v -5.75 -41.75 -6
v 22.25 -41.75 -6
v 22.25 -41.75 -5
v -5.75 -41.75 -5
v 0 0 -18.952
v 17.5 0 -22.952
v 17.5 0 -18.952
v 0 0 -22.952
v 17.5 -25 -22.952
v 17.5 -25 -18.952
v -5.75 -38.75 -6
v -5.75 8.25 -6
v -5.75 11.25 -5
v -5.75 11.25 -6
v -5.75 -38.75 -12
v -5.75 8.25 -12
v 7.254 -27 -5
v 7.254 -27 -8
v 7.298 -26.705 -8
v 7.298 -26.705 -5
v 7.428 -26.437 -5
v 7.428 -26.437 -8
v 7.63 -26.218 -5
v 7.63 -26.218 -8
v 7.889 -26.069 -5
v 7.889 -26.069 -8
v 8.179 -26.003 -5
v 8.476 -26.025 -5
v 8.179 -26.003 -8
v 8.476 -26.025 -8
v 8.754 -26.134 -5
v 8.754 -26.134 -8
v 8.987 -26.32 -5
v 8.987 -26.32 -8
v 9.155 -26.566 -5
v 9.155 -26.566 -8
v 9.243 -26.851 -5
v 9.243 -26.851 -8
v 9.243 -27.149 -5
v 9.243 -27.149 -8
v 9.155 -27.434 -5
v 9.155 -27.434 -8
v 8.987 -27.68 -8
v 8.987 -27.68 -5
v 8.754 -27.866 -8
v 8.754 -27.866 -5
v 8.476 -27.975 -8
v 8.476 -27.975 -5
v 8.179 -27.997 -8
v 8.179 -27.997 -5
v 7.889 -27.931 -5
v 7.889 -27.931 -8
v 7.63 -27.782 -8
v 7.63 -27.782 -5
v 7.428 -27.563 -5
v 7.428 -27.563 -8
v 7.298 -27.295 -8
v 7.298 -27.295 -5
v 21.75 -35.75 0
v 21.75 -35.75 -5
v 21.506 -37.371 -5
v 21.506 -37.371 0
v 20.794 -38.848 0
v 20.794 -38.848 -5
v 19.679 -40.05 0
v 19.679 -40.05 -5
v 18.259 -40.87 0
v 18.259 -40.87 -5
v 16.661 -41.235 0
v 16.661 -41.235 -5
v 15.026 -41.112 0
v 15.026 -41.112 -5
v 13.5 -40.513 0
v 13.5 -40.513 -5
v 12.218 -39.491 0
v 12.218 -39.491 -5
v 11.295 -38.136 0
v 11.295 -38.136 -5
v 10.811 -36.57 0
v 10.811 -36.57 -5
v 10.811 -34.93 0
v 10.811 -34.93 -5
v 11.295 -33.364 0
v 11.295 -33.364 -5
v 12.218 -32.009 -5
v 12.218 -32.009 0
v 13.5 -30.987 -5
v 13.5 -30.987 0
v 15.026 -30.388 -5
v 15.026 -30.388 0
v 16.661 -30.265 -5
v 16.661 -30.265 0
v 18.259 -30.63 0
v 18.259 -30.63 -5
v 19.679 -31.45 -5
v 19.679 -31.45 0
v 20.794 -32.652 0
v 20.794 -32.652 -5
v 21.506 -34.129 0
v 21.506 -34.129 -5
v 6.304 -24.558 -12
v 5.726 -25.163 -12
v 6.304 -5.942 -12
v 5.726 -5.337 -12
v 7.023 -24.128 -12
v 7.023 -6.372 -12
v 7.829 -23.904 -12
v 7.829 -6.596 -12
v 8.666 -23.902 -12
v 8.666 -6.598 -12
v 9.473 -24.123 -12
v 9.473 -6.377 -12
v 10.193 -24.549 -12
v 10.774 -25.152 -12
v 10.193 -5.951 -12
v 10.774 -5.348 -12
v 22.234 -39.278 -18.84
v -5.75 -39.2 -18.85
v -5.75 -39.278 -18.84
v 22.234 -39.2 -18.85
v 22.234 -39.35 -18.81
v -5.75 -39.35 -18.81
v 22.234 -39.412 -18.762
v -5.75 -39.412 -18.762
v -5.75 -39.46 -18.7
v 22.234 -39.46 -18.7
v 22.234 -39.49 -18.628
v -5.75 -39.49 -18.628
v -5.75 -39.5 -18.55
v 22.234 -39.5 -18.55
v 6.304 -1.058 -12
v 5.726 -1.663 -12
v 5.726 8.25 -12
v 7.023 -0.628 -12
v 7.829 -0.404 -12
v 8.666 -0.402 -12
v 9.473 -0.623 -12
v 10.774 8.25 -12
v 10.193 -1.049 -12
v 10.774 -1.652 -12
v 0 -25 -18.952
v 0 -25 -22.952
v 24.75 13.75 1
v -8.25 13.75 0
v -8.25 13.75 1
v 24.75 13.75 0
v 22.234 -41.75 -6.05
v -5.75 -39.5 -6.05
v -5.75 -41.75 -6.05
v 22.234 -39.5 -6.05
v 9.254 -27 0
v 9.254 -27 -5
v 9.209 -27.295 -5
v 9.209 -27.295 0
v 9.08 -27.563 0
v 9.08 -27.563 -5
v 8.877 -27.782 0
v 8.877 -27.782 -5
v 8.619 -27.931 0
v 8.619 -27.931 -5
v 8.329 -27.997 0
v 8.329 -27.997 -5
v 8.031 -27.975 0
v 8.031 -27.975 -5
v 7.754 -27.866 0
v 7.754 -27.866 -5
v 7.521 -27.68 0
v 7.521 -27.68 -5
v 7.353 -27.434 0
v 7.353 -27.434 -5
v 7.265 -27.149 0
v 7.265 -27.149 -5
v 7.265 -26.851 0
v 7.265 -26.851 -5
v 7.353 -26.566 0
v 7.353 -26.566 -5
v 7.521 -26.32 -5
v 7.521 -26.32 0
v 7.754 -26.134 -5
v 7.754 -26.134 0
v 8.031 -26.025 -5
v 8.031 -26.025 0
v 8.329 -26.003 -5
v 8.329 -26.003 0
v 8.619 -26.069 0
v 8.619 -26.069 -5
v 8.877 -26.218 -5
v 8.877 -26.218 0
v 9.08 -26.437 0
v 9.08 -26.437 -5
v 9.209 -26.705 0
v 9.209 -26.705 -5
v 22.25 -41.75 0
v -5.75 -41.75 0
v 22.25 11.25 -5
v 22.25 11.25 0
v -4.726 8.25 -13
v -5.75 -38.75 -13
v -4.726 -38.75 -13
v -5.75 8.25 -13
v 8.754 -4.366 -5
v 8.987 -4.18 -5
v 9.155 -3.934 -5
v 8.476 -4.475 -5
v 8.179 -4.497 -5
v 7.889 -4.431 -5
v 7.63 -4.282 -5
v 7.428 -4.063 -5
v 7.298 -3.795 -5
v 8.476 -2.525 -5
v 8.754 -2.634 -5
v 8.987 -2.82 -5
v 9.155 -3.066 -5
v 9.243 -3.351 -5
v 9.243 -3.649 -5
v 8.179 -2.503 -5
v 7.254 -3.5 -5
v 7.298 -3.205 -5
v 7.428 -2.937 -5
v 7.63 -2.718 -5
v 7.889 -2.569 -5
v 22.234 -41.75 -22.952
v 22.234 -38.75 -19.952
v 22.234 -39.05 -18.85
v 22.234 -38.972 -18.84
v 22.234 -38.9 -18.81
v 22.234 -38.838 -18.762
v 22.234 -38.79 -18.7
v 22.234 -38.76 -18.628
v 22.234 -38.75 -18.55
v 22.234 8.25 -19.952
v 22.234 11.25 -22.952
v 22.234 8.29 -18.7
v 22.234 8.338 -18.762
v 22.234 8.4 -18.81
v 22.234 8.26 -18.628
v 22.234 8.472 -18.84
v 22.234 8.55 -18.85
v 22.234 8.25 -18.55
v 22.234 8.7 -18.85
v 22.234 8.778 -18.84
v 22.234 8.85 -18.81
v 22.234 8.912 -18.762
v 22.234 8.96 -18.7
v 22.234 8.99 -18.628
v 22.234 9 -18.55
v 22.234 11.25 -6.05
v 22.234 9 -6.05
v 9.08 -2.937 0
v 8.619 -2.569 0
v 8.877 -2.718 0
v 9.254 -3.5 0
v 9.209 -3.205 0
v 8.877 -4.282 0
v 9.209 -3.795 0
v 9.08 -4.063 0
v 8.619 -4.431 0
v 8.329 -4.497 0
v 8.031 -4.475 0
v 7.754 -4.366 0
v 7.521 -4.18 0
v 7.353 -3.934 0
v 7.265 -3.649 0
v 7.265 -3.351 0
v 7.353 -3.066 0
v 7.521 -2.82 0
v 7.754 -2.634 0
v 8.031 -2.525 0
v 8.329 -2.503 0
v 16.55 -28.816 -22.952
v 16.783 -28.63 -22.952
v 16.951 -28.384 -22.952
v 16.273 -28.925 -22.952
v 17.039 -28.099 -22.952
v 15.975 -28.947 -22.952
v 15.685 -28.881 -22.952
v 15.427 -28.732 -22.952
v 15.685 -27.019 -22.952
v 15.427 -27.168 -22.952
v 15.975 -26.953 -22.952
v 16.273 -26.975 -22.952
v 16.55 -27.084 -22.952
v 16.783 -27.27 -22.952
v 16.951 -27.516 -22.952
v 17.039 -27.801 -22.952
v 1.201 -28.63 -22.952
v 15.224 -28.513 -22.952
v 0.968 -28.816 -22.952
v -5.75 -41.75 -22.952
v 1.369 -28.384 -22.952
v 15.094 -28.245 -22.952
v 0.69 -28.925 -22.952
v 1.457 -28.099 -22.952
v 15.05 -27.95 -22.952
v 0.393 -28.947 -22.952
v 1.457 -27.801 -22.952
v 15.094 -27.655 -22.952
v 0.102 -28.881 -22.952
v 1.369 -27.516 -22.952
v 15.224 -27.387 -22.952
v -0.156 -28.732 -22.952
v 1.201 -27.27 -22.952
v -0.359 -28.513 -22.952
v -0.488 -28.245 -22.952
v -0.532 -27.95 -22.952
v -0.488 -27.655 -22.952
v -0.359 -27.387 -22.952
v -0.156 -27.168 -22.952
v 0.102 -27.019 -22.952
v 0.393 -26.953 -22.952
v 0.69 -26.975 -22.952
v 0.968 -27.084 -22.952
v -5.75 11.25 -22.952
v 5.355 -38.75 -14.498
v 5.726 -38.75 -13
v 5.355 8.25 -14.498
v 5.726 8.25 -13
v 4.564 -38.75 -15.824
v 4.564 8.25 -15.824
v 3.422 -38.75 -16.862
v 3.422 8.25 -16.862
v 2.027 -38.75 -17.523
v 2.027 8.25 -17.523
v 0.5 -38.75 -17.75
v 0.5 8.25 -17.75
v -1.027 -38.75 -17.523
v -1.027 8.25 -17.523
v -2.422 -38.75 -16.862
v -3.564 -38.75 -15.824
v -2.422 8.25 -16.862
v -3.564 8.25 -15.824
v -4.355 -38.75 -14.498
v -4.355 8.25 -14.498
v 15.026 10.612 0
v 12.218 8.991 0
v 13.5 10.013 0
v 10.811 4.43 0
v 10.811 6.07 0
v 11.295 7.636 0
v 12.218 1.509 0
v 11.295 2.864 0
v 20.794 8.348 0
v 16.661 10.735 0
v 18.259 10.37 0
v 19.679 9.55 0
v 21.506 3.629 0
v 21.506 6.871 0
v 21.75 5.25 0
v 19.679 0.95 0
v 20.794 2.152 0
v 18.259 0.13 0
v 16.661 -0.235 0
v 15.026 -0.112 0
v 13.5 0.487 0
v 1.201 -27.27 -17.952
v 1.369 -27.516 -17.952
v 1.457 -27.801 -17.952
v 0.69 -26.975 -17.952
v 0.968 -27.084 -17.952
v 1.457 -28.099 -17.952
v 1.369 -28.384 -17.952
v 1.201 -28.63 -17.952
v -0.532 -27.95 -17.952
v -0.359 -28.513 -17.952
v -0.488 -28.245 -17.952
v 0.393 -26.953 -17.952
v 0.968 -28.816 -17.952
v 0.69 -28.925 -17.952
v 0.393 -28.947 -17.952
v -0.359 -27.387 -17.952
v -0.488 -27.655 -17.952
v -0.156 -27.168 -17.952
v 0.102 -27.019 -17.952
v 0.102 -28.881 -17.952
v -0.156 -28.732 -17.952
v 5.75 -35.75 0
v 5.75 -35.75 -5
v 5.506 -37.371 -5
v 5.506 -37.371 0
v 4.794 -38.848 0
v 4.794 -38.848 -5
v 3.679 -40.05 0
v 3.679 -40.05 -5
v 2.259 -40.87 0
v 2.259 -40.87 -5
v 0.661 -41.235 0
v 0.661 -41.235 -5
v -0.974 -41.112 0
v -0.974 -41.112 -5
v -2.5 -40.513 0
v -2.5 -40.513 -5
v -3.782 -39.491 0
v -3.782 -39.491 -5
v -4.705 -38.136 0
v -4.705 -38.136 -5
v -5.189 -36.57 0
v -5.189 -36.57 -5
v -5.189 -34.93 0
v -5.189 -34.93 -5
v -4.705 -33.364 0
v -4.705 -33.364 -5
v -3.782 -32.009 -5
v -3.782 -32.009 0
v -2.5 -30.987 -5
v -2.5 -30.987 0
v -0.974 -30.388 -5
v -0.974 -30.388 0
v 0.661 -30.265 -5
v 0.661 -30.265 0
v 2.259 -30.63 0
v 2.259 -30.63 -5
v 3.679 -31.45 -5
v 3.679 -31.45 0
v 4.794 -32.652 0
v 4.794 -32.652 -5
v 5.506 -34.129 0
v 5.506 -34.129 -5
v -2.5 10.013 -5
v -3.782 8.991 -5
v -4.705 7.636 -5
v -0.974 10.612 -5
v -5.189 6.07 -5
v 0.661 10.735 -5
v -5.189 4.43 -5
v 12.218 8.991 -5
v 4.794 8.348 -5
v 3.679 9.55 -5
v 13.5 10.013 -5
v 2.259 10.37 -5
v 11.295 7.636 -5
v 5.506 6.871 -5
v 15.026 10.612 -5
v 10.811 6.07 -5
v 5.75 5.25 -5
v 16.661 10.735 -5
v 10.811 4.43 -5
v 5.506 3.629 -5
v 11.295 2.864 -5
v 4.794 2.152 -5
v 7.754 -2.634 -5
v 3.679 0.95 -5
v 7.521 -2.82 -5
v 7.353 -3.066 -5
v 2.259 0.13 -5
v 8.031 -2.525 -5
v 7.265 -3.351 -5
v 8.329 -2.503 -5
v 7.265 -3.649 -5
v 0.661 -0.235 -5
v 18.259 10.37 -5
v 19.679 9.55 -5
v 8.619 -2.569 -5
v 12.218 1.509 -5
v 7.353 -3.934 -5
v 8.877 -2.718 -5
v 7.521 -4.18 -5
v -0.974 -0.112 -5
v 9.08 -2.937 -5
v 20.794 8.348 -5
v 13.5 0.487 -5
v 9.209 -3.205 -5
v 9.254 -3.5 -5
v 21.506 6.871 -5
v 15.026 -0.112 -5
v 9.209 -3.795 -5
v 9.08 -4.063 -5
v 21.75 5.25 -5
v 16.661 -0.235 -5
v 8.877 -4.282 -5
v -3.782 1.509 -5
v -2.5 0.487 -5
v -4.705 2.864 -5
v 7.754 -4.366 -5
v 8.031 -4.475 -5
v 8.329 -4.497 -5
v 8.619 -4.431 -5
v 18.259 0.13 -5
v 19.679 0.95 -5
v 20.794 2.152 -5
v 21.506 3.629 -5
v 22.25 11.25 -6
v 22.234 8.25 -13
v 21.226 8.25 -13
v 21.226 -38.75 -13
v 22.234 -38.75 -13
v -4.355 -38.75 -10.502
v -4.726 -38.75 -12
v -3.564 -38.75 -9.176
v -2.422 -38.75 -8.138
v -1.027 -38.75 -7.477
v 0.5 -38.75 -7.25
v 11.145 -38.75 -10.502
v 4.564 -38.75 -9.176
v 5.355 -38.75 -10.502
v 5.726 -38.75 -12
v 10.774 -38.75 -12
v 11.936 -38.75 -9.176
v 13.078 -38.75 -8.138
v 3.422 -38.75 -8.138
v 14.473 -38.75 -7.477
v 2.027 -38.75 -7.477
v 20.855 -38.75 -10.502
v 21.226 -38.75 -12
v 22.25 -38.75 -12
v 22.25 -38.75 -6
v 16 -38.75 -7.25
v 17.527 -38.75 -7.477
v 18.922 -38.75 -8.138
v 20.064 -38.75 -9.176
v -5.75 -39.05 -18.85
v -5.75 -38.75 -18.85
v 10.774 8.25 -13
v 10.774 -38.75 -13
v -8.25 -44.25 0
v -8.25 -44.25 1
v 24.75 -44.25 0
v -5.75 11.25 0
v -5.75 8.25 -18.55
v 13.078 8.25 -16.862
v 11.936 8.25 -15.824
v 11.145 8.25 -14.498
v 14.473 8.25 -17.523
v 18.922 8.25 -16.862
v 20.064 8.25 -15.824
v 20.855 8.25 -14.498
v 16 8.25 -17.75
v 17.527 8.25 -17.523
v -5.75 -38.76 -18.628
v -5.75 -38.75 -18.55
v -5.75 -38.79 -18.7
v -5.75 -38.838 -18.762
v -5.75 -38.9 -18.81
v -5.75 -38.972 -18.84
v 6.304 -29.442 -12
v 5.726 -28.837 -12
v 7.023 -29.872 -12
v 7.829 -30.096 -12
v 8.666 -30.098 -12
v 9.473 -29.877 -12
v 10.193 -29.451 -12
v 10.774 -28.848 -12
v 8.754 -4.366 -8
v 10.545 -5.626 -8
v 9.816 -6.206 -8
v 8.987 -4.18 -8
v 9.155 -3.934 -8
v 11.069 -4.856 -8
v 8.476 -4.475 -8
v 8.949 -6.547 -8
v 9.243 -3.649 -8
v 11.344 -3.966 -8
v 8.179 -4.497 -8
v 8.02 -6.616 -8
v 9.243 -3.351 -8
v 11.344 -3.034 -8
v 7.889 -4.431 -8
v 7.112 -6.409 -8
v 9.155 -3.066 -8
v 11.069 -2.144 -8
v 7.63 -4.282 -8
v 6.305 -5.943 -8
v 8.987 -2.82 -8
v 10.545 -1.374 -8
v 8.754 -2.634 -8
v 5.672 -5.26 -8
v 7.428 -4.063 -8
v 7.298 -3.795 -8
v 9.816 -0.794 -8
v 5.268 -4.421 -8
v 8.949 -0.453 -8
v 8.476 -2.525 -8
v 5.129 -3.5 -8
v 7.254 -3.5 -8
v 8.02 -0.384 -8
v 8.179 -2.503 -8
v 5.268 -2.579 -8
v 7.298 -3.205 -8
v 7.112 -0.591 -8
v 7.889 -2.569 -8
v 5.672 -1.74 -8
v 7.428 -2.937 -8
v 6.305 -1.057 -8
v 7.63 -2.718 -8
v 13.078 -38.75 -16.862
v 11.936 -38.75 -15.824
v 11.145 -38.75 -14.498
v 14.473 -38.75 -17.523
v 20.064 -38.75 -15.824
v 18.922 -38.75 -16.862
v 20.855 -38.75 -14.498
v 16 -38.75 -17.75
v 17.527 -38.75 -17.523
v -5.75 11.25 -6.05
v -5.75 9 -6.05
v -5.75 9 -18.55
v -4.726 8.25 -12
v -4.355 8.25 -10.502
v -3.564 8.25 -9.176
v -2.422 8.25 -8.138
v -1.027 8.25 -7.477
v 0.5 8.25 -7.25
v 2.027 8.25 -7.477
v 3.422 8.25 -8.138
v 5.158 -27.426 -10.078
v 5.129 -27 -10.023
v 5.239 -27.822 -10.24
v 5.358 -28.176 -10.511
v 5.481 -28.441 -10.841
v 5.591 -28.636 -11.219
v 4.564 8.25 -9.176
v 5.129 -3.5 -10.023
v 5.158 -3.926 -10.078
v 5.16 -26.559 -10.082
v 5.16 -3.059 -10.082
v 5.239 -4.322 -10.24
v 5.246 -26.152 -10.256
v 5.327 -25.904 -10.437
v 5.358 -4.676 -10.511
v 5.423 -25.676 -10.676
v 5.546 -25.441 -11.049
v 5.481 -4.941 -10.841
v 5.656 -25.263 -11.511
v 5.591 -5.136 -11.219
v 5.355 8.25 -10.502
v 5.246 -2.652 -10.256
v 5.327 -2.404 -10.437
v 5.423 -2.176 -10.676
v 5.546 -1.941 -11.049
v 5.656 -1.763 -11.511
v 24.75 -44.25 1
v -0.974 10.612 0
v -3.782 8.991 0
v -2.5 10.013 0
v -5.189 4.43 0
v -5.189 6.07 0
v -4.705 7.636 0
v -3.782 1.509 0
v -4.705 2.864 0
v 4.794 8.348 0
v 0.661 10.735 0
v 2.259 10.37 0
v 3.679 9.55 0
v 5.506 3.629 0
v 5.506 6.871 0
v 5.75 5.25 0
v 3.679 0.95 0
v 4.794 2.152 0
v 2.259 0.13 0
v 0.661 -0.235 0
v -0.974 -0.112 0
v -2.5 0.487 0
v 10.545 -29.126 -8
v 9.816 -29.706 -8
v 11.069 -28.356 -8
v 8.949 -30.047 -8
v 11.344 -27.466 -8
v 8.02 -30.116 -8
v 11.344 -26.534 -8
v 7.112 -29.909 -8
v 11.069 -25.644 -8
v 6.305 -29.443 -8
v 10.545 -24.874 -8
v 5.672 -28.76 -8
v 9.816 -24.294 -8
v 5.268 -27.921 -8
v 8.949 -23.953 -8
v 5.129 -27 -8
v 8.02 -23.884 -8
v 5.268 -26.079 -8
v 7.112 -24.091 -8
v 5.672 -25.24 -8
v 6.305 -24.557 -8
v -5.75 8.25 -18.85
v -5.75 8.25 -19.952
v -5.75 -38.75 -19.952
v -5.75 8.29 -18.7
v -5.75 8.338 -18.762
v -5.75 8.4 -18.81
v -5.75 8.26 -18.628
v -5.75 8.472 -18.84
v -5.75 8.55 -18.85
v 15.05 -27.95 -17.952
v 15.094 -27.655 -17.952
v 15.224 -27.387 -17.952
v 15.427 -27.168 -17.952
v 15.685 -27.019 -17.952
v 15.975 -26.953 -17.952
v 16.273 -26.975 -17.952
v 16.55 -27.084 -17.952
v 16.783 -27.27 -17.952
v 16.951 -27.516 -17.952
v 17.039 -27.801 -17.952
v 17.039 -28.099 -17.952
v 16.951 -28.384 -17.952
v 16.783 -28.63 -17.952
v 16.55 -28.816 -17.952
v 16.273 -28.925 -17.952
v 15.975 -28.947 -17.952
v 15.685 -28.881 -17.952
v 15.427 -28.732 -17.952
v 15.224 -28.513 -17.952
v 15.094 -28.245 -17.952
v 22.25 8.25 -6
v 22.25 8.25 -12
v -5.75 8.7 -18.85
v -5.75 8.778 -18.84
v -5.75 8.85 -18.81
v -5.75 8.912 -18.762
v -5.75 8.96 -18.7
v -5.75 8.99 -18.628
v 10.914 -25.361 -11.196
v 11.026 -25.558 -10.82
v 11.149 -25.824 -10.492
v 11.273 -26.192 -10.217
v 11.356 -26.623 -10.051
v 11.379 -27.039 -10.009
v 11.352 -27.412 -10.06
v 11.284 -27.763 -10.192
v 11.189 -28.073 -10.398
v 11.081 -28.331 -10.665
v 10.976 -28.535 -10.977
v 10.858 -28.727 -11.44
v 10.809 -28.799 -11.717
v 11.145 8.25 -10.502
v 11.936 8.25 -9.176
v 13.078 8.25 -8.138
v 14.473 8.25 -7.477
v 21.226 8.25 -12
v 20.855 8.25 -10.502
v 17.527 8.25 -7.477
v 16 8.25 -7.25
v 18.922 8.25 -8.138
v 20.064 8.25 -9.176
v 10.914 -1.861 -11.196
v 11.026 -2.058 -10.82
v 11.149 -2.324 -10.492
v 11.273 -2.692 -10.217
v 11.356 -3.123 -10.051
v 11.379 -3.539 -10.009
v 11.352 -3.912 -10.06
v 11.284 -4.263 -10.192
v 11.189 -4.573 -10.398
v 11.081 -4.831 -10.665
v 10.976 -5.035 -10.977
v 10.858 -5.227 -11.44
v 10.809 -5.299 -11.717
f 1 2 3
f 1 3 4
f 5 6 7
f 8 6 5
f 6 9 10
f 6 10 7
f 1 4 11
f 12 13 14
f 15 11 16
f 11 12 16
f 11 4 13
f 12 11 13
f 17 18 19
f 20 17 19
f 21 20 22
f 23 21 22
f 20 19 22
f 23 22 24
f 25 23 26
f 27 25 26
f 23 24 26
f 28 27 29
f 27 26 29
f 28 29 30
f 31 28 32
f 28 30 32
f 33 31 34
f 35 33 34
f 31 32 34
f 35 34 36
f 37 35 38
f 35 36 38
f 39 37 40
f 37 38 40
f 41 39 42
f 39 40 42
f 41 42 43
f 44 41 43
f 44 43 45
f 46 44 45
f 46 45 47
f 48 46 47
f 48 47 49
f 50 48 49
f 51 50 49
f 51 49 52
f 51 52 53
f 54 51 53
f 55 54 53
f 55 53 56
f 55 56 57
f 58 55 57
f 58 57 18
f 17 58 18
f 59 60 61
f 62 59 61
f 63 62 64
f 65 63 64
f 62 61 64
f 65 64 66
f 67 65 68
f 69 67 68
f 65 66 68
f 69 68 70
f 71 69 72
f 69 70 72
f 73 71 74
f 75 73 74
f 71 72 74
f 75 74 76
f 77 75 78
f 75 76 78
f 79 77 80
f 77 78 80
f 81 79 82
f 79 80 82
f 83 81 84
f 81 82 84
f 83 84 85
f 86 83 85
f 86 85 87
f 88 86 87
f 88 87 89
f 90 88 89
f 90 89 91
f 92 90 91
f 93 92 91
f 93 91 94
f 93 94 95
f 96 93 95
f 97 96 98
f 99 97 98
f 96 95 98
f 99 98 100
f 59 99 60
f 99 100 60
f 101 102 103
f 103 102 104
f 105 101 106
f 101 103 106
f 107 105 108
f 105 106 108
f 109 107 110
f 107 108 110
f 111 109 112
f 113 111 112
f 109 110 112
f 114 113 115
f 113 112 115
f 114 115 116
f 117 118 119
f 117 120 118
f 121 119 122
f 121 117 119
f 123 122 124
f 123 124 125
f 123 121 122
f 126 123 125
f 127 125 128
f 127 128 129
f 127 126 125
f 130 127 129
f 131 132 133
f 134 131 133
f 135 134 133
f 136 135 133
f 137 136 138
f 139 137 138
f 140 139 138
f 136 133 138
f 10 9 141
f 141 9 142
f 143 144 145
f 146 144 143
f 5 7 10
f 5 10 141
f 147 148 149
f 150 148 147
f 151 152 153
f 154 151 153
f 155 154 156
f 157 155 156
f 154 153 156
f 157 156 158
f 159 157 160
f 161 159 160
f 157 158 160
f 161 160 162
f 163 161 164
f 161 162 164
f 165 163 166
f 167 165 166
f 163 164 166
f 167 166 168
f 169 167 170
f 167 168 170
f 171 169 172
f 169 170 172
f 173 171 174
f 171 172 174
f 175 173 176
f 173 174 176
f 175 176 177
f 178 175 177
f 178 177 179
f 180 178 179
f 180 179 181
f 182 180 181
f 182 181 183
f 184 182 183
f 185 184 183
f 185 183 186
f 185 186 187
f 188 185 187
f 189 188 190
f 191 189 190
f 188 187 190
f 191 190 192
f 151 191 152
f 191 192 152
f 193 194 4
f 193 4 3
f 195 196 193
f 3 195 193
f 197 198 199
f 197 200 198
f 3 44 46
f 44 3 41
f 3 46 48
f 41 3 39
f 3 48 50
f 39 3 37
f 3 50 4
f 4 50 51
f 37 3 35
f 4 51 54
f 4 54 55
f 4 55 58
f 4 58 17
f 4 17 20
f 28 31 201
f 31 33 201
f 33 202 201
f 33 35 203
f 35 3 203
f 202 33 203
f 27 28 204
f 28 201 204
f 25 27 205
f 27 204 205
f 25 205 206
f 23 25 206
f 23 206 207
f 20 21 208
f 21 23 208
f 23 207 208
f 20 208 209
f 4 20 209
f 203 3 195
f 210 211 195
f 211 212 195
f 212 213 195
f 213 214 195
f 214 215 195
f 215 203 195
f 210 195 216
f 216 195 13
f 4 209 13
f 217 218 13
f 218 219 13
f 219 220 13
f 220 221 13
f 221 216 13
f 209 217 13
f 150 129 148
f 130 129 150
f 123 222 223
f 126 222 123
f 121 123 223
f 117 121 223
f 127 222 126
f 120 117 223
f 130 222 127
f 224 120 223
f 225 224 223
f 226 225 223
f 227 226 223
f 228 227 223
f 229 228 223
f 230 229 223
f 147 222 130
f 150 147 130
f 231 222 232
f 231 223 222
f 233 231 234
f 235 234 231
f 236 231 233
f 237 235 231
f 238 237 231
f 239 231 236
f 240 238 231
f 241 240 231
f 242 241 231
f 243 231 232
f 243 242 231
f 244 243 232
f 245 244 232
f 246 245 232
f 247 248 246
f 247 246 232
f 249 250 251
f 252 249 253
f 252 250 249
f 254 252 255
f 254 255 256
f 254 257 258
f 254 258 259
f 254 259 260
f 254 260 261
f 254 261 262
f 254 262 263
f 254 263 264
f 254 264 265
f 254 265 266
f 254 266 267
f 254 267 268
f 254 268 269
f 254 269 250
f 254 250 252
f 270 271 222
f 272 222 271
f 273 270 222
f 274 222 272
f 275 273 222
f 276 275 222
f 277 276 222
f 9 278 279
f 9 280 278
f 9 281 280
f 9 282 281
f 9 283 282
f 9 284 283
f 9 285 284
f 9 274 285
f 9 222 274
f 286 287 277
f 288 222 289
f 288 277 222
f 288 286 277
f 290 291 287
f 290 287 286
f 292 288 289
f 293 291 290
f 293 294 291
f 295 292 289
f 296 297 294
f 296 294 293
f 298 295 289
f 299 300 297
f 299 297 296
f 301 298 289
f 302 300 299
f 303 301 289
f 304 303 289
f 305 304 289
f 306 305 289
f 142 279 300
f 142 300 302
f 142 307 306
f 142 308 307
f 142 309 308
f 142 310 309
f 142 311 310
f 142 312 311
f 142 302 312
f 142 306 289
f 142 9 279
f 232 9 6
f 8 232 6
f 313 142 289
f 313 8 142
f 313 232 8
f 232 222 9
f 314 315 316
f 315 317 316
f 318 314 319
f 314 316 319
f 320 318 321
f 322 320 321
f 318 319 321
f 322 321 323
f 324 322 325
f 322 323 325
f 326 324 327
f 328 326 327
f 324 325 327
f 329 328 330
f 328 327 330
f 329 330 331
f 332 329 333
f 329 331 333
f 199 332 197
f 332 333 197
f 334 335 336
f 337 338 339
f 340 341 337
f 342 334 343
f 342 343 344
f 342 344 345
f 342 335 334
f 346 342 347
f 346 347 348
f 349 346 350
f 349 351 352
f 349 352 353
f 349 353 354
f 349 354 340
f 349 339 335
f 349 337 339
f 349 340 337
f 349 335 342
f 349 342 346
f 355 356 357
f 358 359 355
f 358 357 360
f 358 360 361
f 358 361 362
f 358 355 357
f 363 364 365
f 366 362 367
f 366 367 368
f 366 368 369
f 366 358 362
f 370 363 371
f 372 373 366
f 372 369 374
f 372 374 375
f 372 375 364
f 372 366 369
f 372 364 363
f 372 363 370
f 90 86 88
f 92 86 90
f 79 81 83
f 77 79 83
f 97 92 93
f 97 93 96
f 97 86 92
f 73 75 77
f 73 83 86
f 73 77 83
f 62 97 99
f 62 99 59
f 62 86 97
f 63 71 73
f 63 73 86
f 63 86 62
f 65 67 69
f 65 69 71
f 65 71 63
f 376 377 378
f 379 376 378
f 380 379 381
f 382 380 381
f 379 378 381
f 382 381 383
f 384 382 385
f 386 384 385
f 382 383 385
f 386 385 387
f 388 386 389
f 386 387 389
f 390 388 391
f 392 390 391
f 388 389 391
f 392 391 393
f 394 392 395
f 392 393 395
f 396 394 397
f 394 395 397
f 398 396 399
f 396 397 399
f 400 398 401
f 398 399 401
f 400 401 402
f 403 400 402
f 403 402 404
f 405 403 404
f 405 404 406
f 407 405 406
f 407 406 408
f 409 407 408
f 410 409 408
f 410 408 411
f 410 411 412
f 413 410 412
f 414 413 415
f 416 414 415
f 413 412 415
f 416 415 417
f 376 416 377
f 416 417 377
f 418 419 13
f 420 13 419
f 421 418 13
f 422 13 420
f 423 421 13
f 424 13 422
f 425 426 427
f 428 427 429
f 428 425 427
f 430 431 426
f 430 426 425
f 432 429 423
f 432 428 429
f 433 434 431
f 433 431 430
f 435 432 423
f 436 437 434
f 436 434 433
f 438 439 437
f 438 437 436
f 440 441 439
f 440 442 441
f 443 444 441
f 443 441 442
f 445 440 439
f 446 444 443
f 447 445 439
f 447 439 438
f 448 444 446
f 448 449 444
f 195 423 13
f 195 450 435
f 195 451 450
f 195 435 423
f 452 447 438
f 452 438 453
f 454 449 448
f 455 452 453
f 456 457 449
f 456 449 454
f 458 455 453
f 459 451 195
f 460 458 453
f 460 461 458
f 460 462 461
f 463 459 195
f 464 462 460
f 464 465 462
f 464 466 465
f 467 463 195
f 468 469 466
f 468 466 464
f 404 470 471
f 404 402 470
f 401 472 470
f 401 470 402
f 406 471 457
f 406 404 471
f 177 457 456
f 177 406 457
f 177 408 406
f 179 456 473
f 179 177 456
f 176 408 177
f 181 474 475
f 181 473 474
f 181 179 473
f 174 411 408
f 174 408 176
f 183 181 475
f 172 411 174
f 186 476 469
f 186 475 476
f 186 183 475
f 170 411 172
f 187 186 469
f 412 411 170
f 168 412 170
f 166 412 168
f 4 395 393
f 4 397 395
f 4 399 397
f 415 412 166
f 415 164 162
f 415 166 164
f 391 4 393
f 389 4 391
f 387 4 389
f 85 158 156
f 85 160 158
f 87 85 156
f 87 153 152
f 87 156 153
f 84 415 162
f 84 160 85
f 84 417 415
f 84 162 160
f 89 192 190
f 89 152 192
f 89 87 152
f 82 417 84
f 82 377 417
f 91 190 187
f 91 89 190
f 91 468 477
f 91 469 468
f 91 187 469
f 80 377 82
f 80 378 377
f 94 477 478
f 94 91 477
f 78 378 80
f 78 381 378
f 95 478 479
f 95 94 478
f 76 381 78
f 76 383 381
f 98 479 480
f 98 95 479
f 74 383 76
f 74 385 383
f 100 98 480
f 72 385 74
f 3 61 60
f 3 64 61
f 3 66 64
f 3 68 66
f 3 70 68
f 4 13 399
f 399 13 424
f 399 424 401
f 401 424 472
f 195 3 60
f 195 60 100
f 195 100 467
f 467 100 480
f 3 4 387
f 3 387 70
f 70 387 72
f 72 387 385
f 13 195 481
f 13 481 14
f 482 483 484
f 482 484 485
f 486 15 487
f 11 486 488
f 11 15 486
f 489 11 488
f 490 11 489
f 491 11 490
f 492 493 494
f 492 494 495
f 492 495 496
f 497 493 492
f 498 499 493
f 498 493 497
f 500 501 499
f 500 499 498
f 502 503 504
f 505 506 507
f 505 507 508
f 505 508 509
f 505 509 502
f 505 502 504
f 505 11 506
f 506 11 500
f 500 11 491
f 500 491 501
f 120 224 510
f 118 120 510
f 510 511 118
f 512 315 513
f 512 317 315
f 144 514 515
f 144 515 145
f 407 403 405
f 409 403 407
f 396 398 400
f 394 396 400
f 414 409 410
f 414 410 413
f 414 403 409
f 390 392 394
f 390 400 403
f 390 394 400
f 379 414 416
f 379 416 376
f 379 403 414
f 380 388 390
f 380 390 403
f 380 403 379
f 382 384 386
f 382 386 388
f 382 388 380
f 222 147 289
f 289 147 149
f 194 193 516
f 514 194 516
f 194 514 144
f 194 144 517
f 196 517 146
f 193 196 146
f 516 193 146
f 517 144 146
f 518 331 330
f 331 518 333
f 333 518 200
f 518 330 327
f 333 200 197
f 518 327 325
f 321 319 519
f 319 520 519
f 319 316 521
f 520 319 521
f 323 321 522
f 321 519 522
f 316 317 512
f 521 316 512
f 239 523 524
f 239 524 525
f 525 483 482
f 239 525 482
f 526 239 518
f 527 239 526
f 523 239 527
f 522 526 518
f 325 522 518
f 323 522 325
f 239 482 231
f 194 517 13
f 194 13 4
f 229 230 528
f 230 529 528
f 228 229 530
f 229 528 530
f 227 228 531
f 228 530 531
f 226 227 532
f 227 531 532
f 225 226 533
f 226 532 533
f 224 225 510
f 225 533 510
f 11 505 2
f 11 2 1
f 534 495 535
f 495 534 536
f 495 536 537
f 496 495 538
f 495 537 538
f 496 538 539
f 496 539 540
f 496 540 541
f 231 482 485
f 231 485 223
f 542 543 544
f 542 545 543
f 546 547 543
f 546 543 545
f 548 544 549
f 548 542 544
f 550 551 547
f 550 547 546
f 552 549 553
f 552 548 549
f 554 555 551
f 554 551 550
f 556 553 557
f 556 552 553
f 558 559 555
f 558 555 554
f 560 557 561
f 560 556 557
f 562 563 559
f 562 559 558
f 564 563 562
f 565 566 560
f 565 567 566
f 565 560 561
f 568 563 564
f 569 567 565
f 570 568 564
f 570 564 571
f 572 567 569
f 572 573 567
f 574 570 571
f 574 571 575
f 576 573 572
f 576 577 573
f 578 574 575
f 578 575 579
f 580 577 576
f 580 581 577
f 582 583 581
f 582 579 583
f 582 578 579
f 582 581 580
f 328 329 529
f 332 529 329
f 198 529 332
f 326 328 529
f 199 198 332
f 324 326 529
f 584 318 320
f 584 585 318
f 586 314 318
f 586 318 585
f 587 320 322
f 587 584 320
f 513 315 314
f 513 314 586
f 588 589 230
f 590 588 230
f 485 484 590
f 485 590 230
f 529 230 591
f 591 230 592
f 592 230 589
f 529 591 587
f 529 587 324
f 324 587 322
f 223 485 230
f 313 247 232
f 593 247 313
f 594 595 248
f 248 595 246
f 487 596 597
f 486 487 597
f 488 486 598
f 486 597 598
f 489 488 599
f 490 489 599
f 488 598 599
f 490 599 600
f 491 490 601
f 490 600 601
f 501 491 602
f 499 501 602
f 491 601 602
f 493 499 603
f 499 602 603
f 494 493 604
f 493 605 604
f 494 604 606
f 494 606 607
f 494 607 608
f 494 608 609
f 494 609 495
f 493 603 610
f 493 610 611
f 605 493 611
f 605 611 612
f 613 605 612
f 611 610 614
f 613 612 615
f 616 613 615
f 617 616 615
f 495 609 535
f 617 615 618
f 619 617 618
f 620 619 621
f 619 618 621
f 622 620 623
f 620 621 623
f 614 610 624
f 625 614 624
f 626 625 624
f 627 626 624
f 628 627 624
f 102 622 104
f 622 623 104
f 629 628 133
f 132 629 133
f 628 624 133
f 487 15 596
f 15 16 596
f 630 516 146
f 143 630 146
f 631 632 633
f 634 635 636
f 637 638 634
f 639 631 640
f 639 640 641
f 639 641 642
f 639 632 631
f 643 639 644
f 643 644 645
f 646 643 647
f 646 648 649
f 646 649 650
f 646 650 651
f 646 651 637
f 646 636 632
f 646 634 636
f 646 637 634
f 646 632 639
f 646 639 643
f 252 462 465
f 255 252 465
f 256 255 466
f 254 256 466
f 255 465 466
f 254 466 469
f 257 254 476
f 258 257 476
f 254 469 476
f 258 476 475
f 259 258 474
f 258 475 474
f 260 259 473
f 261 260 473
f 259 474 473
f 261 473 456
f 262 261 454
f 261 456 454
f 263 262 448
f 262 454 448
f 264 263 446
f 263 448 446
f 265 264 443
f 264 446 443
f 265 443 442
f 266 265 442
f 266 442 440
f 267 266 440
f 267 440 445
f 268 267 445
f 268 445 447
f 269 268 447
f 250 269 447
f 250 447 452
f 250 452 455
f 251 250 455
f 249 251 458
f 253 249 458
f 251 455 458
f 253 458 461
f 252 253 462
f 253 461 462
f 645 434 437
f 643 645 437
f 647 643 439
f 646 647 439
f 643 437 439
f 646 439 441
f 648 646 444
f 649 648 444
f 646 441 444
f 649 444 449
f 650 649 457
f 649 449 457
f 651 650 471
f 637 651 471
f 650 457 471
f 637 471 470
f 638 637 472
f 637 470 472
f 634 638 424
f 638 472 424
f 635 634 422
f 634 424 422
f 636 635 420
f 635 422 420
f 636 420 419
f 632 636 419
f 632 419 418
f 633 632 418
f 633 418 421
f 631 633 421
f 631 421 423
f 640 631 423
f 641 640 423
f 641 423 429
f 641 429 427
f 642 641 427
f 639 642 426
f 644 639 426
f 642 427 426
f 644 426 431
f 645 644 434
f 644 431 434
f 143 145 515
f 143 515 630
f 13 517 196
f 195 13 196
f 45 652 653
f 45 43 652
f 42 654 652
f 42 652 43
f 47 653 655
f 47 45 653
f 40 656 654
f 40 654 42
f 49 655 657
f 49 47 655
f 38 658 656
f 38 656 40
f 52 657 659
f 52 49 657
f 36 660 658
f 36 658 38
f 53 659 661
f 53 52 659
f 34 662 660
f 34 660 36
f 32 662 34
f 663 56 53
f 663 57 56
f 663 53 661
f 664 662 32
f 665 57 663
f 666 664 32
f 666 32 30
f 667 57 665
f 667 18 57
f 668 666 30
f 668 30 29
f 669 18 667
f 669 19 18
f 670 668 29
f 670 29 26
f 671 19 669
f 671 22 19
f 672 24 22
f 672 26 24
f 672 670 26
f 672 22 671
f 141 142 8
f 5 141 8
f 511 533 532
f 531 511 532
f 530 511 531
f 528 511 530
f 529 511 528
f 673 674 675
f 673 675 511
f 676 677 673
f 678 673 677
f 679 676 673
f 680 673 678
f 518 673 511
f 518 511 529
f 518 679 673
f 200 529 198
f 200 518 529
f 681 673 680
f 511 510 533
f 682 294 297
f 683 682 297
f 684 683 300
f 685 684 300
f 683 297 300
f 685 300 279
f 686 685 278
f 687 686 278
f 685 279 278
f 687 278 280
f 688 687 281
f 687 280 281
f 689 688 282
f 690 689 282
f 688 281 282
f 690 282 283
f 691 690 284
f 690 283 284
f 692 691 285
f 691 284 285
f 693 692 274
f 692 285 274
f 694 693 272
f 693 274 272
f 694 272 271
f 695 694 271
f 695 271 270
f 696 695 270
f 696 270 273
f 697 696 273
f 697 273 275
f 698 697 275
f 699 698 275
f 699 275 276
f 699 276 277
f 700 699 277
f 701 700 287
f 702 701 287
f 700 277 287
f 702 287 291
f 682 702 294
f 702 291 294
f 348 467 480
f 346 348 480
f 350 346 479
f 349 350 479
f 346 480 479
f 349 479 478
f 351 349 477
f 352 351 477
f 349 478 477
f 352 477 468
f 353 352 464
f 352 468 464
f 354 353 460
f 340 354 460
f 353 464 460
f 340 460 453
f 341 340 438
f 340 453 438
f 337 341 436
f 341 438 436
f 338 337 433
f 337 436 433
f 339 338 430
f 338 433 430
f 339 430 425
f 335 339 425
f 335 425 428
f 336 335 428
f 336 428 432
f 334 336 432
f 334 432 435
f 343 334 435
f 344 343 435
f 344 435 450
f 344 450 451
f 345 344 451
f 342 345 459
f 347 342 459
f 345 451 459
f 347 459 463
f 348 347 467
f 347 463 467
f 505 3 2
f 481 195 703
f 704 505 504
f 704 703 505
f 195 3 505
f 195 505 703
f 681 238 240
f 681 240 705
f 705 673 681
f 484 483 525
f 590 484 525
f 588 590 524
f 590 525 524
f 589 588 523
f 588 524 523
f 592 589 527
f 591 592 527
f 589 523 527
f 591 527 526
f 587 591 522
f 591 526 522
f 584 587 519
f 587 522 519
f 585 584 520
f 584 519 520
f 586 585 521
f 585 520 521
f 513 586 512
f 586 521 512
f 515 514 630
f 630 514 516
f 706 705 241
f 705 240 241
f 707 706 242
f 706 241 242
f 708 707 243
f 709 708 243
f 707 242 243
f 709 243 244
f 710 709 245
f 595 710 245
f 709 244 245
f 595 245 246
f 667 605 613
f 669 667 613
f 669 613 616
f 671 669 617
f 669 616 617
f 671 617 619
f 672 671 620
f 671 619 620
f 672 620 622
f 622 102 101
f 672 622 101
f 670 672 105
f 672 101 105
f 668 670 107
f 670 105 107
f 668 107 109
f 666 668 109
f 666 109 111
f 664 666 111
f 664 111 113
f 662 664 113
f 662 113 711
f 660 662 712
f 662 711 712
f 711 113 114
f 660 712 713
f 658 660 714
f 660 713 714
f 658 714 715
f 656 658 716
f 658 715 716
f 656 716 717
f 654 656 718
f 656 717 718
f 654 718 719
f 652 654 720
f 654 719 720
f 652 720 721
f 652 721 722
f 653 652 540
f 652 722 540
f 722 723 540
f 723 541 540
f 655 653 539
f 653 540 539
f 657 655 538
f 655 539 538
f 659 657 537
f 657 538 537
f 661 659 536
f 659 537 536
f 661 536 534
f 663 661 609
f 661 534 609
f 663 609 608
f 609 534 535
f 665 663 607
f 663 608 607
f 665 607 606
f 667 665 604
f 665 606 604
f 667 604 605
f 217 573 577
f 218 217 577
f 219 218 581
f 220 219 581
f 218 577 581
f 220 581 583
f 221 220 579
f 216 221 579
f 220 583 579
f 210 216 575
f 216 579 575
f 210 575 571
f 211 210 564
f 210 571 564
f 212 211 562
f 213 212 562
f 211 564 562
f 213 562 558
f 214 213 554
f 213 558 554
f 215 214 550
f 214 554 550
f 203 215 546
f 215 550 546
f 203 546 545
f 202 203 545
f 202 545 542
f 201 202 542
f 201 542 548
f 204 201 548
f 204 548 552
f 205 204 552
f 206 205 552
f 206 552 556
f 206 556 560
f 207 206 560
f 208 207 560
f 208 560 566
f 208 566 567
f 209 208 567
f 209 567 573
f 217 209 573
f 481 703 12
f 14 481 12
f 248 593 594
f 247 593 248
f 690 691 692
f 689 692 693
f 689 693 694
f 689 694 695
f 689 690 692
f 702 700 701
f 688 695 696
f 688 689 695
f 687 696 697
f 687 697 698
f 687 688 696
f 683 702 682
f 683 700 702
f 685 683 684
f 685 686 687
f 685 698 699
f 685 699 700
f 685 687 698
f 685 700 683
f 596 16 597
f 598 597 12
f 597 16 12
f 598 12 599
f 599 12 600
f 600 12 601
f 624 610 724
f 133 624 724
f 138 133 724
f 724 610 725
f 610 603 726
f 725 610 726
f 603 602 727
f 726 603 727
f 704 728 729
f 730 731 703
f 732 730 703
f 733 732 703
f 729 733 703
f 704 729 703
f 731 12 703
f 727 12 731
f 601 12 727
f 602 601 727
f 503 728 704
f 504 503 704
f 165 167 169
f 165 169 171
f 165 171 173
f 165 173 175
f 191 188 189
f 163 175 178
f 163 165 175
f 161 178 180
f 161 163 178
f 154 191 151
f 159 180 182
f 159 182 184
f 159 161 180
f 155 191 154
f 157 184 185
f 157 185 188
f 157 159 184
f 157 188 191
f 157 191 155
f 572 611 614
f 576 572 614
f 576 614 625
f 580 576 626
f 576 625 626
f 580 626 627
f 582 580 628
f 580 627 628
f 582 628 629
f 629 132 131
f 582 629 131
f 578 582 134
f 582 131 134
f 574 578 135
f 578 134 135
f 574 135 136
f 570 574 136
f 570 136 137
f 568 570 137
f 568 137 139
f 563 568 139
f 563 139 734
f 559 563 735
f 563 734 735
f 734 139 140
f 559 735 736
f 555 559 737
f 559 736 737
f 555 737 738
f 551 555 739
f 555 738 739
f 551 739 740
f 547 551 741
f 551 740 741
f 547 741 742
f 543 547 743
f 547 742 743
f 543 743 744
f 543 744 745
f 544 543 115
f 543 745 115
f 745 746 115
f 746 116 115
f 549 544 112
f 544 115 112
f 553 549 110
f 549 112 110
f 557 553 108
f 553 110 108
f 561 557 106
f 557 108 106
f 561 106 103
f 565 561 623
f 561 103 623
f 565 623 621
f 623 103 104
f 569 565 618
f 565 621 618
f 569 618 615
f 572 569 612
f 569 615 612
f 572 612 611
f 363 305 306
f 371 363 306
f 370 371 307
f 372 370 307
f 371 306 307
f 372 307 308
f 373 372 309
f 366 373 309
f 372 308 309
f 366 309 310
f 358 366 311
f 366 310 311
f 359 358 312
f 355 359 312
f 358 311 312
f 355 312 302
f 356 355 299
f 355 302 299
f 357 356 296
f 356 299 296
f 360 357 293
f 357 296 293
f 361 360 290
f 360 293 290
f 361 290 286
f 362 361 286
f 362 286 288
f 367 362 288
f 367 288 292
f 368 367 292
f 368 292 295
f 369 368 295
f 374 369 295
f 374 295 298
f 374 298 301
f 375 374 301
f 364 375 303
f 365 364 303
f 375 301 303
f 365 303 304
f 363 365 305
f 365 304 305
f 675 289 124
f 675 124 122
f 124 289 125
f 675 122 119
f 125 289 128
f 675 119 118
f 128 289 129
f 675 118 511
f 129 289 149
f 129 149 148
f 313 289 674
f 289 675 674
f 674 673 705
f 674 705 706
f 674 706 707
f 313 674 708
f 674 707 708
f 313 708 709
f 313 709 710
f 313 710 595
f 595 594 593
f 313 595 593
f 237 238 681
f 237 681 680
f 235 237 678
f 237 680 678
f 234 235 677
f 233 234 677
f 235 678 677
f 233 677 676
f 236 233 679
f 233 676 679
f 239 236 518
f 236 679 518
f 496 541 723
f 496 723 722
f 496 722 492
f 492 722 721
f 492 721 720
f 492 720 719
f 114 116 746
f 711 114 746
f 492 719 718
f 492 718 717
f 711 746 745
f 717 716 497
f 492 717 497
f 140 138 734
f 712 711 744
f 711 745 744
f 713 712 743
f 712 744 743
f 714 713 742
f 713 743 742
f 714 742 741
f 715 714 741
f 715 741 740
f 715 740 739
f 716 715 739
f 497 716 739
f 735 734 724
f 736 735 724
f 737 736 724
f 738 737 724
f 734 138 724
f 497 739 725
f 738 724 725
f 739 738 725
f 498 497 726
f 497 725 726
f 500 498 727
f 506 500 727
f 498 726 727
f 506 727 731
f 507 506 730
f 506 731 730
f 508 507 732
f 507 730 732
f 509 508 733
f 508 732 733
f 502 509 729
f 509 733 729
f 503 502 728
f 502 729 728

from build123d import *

# Parameters (mm, degrees)
SKETCH001_W     = 33
SKETCH001_H     = 58
PAD_DEPTH       = 1
SKETCH002_W     = 28
SKETCH002_H     = 53
PAD001_DEPTH    = 5
SKETCH003_R     = 5.5
POCKET_DEPTH    = 5
SKETCH015_R     = 1
POCKET003_DEPTH = 5
PAD002_DEPTH    = 23.5
SKETCH005_W     = 28
SKETCH005_H     = 1
PAD003_DEPTH    = 3
SKETCH012_W     = 28
SKETCH012_H     = 1
PAD009_DEPTH    = 3
SKETCH013_R     = 3.125
POCKET001_DEPTH = 4
SKETCH014_R     = 1
POCKET002_DEPTH = 5
PAD004_DEPTH    = 23.5
SKETCH008_W     = 27.983581
SKETCH008_H     = 1.102446
PAD005_DEPTH    = 3
SKETCH009_W     = 27.983581
SKETCH009_H     = 2.25
PAD006_DEPTH    = 12.8
FILLET_R        = 0.3
SKETCH010_W     = 27.983581
SKETCH010_H     = 1.102446
PAD007_DEPTH    = 3
SKETCH011_W     = 27.983581
SKETCH011_H     = 2.25
PAD008_DEPTH    = 12.8
FILLET001_R     = 0.3
SKETCH018_W     = 27.983581
SKETCH018_H     = 53
PAD010_DEPTH    = 3
SKETCH019_W     = 17.5
SKETCH019_H     = 25
POCKET004_DEPTH = 4
SKETCH020_R     = 1
POCKET005_DEPTH = 5


with BuildPart() as base:
    # Sketch001 → Pad (new body)
    with BuildSketch(Plane.XY):
        with Locations((8.25, -15.25)):
            Rectangle(SKETCH001_W, SKETCH001_H)
    extrude(amount=PAD_DEPTH)

    # Sketch002 (on Face5 of Pad) → Pad001 (join)
    with BuildSketch(Plane(origin=(0, 0, 0), x_dir=(1, 0, 0), z_dir=(0, 0, -1))):
        with Locations((8.25, 15.25)):
            Rectangle(SKETCH002_W, SKETCH002_H)
    extrude(amount=PAD001_DEPTH)

    # Sketch003 (on Face11 of Pad001) → Pocket (cut)
    with BuildSketch(Plane(origin=(0, 0, -5), x_dir=(1, 0, 0), z_dir=(0, 0, -1))):
        with Locations((0.25, 35.75)):
            Circle(SKETCH003_R)
        with Locations((16.25, 35.75)):
            Circle(SKETCH003_R)
        with Locations((0.25, -5.25)):
            Circle(SKETCH003_R)
        with Locations((16.25, -5.25)):
            Circle(SKETCH003_R)
    extrude(amount=-POCKET_DEPTH, mode=Mode.SUBTRACT)

    # Sketch015 (on Face11 of Pocket) → Pocket003 (cut)
    with BuildSketch(Plane(origin=(0, 0, -5), x_dir=(1, 0, 0), z_dir=(0, 0, -1))):
        with Locations((8.253864, 3.5)):
            Circle(SKETCH015_R)
        with Locations((8.253864, 27)):
            Circle(SKETCH015_R)
    extrude(amount=-POCKET003_DEPTH, mode=Mode.SUBTRACT)


with BuildPart() as battery:
    # Sketch004 (on DatumPlane) → Pad002 (new body, symmetric)
    with BuildSketch(Plane(origin=(0, -15.25, 0), x_dir=(-1, 0, 0), z_dir=(0, 1, 0))):
        with BuildLine():
            Line((-22.25, -5), (5.75, -5))
            Line((5.75, -5), (5.75, -12))
            Line((5.75, -12), (4.726136, -12))
            ThreePointArc((4.726136, -12), (-0.5, -7.25), (-5.726136, -12))
            Line((-5.726136, -12), (-10.773864, -12))
            ThreePointArc((-10.773864, -12), (-16, -7.25), (-21.226136, -12))
            Line((-21.226136, -12), (-22.25, -12))
            Line((-22.25, -12), (-22.25, -5))
        make_face()
    extrude(amount=PAD002_DEPTH, both=True)

    # Sketch005 (on Face10 of Pad002) → Pad003 (join)
    with BuildSketch(Plane(origin=(0, 8.25, 0), x_dir=(-1, 0, 0), z_dir=(0, 1, 0))):
        with Locations((-8.25, -5.5)):
            Rectangle(SKETCH005_W, SKETCH005_H)
    extrude(amount=PAD003_DEPTH)

    # Sketch012 (on Face4 of Pad003) → Pad009 (join)
    with BuildSketch(Plane(origin=(0, -38.75, 0), x_dir=(-1, 0, 0), z_dir=(0, -1, 0))):
        with Locations((-8.25, 5.5)):
            Rectangle(SKETCH012_W, SKETCH012_H)
    extrude(amount=PAD009_DEPTH)

    # Sketch013 (on Face17 of Pad009) → Pocket001 (cut)
    with BuildSketch(Plane(origin=(0, -15.25, -12), x_dir=(-1, 0, 0), z_dir=(0, 0, -1))):
        with Locations((-8.253864, 11.75)):
            Circle(SKETCH013_R)
        with Locations((-8.253864, -11.75)):
            Circle(SKETCH013_R)
    extrude(amount=-POCKET001_DEPTH, mode=Mode.SUBTRACT)

    # Sketch014 (on Face26 of Pocket001) → Pocket002 (cut)
    with BuildSketch(Plane(origin=(0, -15.25, -8), x_dir=(-1, 0, 0), z_dir=(0, 0, -1))):
        with Locations((-8.253864, 11.75)):
            Circle(SKETCH014_R)
        with Locations((-8.253864, -11.75)):
            Circle(SKETCH014_R)
    extrude(amount=-POCKET002_DEPTH, mode=Mode.SUBTRACT)


with BuildPart() as body002:
    # Sketch007 (on DatumPlane) → Pad004 (new body, symmetric)
    with BuildSketch(Plane(origin=(0, -15.25, 0), x_dir=(-1, 0, 0), z_dir=(0, 1, 0))):
        with BuildLine():
            ThreePointArc((-21.226136, -13), (-16, -17.75), (-10.773864, -13))
            Line((-5.726136, -13), (-10.773864, -13))
            ThreePointArc((-5.726136, -13), (-0.5, -17.75), (4.726136, -13))
            Line((5.75, -13), (4.726136, -13))
            Line((5.75, -17.924353), (5.75, -13))
            Line((5.75, -17.924353), (5.75, -19.952446))
            Line((5.75, -19.952446), (-22.233581, -19.952446))
            Line((-22.233581, -19.952446), (-22.233581, -17.75))
            Line((-22.233581, -13), (-22.233581, -17.75))
            Line((-21.226136, -13), (-22.233581, -13))
        make_face()
    extrude(amount=PAD004_DEPTH, both=True)

    # Sketch008 (on Face12 of Pad004) → Pad005 (join)
    with BuildSketch(Plane(origin=(0, 8.25, 0), x_dir=(-1, 0, 0), z_dir=(0, 1, 0))):
        with Locations((-8.24179, -19.401223)):
            Rectangle(SKETCH008_W, SKETCH008_H)
    extrude(amount=PAD005_DEPTH)

    # Sketch009 (on Face13 of Pad005) → Pad006 (join)
    with BuildSketch(Plane(origin=(0, -15.25, -18.85), x_dir=(1, 0, 0), z_dir=(0, 0, 1))):
        with Locations((8.24179, 25.375)):
            Rectangle(SKETCH009_W, SKETCH009_H)
    extrude(amount=PAD006_DEPTH)

    # Fillet
    fillet_edges = [body002.edges().sort_by_distance(p)[0] for p in [
        (8.241791, 8.25, -18.85),
        (8.241791, 9, -18.85),
    ]]
    fillet(fillet_edges, radius=FILLET_R)

    # Sketch010 (on Face13 of Fillet) → Pad007 (join)
    with BuildSketch(Plane(origin=(0, -38.75, 0), x_dir=(-1, 0, 0), z_dir=(0, -1, 0))):
        with Locations((-8.24179, 19.401223)):
            Rectangle(SKETCH010_W, SKETCH010_H)
    extrude(amount=PAD007_DEPTH)

    # Sketch011 (on Face22 of Pad007) → Pad008 (join)
    with BuildSketch(Plane(origin=(0, -15.25, -18.85), x_dir=(1, 0, 0), z_dir=(0, 0, 1))):
        with Locations((8.24179, -25.375)):
            Rectangle(SKETCH011_W, SKETCH011_H)
    extrude(amount=PAD008_DEPTH)

    # Fillet001
    fillet001_edges = [body002.edges().sort_by_distance(p)[0] for p in [
        (8.241791, -39.5, -18.85),
        (8.241791, -38.75, -18.85),
    ]]
    fillet(fillet001_edges, radius=FILLET001_R)

    # Sketch018 (on Face6 of Fillet001) → Pad010 (join)
    with BuildSketch(Plane(origin=(0, -15.25, -19.952446), x_dir=(-1, 0, 0), z_dir=(0, 0, -1))):
        with Locations((-8.24179, 0)):
            Rectangle(SKETCH018_W, SKETCH018_H)
    extrude(amount=PAD010_DEPTH)

    # Sketch019 (on Face22 of Pad010) → Pocket004 (cut)
    with BuildSketch(Plane(origin=(0, -15.25, -22.952446), x_dir=(-1, 0, 0), z_dir=(0, 0, -1))):
        with Locations((-8.75, 2.75)):
            Rectangle(SKETCH019_W, SKETCH019_H)
    extrude(amount=-POCKET004_DEPTH, mode=Mode.SUBTRACT)

    # Sketch020 (on Face22 of Pocket004) → Pocket005 (cut)
    with BuildSketch(Plane(origin=(0, -15.25, -22.952446), x_dir=(-1, 0, 0), z_dir=(0, 0, -1))):
        with Locations((-16.05, -12.7)):
            Circle(SKETCH020_R)
        with Locations((-0.467721, -12.7)):
            Circle(SKETCH020_R)
    extrude(amount=-POCKET005_DEPTH, mode=Mode.SUBTRACT)


solid = Compound([base.part, battery.part, body002.part])
